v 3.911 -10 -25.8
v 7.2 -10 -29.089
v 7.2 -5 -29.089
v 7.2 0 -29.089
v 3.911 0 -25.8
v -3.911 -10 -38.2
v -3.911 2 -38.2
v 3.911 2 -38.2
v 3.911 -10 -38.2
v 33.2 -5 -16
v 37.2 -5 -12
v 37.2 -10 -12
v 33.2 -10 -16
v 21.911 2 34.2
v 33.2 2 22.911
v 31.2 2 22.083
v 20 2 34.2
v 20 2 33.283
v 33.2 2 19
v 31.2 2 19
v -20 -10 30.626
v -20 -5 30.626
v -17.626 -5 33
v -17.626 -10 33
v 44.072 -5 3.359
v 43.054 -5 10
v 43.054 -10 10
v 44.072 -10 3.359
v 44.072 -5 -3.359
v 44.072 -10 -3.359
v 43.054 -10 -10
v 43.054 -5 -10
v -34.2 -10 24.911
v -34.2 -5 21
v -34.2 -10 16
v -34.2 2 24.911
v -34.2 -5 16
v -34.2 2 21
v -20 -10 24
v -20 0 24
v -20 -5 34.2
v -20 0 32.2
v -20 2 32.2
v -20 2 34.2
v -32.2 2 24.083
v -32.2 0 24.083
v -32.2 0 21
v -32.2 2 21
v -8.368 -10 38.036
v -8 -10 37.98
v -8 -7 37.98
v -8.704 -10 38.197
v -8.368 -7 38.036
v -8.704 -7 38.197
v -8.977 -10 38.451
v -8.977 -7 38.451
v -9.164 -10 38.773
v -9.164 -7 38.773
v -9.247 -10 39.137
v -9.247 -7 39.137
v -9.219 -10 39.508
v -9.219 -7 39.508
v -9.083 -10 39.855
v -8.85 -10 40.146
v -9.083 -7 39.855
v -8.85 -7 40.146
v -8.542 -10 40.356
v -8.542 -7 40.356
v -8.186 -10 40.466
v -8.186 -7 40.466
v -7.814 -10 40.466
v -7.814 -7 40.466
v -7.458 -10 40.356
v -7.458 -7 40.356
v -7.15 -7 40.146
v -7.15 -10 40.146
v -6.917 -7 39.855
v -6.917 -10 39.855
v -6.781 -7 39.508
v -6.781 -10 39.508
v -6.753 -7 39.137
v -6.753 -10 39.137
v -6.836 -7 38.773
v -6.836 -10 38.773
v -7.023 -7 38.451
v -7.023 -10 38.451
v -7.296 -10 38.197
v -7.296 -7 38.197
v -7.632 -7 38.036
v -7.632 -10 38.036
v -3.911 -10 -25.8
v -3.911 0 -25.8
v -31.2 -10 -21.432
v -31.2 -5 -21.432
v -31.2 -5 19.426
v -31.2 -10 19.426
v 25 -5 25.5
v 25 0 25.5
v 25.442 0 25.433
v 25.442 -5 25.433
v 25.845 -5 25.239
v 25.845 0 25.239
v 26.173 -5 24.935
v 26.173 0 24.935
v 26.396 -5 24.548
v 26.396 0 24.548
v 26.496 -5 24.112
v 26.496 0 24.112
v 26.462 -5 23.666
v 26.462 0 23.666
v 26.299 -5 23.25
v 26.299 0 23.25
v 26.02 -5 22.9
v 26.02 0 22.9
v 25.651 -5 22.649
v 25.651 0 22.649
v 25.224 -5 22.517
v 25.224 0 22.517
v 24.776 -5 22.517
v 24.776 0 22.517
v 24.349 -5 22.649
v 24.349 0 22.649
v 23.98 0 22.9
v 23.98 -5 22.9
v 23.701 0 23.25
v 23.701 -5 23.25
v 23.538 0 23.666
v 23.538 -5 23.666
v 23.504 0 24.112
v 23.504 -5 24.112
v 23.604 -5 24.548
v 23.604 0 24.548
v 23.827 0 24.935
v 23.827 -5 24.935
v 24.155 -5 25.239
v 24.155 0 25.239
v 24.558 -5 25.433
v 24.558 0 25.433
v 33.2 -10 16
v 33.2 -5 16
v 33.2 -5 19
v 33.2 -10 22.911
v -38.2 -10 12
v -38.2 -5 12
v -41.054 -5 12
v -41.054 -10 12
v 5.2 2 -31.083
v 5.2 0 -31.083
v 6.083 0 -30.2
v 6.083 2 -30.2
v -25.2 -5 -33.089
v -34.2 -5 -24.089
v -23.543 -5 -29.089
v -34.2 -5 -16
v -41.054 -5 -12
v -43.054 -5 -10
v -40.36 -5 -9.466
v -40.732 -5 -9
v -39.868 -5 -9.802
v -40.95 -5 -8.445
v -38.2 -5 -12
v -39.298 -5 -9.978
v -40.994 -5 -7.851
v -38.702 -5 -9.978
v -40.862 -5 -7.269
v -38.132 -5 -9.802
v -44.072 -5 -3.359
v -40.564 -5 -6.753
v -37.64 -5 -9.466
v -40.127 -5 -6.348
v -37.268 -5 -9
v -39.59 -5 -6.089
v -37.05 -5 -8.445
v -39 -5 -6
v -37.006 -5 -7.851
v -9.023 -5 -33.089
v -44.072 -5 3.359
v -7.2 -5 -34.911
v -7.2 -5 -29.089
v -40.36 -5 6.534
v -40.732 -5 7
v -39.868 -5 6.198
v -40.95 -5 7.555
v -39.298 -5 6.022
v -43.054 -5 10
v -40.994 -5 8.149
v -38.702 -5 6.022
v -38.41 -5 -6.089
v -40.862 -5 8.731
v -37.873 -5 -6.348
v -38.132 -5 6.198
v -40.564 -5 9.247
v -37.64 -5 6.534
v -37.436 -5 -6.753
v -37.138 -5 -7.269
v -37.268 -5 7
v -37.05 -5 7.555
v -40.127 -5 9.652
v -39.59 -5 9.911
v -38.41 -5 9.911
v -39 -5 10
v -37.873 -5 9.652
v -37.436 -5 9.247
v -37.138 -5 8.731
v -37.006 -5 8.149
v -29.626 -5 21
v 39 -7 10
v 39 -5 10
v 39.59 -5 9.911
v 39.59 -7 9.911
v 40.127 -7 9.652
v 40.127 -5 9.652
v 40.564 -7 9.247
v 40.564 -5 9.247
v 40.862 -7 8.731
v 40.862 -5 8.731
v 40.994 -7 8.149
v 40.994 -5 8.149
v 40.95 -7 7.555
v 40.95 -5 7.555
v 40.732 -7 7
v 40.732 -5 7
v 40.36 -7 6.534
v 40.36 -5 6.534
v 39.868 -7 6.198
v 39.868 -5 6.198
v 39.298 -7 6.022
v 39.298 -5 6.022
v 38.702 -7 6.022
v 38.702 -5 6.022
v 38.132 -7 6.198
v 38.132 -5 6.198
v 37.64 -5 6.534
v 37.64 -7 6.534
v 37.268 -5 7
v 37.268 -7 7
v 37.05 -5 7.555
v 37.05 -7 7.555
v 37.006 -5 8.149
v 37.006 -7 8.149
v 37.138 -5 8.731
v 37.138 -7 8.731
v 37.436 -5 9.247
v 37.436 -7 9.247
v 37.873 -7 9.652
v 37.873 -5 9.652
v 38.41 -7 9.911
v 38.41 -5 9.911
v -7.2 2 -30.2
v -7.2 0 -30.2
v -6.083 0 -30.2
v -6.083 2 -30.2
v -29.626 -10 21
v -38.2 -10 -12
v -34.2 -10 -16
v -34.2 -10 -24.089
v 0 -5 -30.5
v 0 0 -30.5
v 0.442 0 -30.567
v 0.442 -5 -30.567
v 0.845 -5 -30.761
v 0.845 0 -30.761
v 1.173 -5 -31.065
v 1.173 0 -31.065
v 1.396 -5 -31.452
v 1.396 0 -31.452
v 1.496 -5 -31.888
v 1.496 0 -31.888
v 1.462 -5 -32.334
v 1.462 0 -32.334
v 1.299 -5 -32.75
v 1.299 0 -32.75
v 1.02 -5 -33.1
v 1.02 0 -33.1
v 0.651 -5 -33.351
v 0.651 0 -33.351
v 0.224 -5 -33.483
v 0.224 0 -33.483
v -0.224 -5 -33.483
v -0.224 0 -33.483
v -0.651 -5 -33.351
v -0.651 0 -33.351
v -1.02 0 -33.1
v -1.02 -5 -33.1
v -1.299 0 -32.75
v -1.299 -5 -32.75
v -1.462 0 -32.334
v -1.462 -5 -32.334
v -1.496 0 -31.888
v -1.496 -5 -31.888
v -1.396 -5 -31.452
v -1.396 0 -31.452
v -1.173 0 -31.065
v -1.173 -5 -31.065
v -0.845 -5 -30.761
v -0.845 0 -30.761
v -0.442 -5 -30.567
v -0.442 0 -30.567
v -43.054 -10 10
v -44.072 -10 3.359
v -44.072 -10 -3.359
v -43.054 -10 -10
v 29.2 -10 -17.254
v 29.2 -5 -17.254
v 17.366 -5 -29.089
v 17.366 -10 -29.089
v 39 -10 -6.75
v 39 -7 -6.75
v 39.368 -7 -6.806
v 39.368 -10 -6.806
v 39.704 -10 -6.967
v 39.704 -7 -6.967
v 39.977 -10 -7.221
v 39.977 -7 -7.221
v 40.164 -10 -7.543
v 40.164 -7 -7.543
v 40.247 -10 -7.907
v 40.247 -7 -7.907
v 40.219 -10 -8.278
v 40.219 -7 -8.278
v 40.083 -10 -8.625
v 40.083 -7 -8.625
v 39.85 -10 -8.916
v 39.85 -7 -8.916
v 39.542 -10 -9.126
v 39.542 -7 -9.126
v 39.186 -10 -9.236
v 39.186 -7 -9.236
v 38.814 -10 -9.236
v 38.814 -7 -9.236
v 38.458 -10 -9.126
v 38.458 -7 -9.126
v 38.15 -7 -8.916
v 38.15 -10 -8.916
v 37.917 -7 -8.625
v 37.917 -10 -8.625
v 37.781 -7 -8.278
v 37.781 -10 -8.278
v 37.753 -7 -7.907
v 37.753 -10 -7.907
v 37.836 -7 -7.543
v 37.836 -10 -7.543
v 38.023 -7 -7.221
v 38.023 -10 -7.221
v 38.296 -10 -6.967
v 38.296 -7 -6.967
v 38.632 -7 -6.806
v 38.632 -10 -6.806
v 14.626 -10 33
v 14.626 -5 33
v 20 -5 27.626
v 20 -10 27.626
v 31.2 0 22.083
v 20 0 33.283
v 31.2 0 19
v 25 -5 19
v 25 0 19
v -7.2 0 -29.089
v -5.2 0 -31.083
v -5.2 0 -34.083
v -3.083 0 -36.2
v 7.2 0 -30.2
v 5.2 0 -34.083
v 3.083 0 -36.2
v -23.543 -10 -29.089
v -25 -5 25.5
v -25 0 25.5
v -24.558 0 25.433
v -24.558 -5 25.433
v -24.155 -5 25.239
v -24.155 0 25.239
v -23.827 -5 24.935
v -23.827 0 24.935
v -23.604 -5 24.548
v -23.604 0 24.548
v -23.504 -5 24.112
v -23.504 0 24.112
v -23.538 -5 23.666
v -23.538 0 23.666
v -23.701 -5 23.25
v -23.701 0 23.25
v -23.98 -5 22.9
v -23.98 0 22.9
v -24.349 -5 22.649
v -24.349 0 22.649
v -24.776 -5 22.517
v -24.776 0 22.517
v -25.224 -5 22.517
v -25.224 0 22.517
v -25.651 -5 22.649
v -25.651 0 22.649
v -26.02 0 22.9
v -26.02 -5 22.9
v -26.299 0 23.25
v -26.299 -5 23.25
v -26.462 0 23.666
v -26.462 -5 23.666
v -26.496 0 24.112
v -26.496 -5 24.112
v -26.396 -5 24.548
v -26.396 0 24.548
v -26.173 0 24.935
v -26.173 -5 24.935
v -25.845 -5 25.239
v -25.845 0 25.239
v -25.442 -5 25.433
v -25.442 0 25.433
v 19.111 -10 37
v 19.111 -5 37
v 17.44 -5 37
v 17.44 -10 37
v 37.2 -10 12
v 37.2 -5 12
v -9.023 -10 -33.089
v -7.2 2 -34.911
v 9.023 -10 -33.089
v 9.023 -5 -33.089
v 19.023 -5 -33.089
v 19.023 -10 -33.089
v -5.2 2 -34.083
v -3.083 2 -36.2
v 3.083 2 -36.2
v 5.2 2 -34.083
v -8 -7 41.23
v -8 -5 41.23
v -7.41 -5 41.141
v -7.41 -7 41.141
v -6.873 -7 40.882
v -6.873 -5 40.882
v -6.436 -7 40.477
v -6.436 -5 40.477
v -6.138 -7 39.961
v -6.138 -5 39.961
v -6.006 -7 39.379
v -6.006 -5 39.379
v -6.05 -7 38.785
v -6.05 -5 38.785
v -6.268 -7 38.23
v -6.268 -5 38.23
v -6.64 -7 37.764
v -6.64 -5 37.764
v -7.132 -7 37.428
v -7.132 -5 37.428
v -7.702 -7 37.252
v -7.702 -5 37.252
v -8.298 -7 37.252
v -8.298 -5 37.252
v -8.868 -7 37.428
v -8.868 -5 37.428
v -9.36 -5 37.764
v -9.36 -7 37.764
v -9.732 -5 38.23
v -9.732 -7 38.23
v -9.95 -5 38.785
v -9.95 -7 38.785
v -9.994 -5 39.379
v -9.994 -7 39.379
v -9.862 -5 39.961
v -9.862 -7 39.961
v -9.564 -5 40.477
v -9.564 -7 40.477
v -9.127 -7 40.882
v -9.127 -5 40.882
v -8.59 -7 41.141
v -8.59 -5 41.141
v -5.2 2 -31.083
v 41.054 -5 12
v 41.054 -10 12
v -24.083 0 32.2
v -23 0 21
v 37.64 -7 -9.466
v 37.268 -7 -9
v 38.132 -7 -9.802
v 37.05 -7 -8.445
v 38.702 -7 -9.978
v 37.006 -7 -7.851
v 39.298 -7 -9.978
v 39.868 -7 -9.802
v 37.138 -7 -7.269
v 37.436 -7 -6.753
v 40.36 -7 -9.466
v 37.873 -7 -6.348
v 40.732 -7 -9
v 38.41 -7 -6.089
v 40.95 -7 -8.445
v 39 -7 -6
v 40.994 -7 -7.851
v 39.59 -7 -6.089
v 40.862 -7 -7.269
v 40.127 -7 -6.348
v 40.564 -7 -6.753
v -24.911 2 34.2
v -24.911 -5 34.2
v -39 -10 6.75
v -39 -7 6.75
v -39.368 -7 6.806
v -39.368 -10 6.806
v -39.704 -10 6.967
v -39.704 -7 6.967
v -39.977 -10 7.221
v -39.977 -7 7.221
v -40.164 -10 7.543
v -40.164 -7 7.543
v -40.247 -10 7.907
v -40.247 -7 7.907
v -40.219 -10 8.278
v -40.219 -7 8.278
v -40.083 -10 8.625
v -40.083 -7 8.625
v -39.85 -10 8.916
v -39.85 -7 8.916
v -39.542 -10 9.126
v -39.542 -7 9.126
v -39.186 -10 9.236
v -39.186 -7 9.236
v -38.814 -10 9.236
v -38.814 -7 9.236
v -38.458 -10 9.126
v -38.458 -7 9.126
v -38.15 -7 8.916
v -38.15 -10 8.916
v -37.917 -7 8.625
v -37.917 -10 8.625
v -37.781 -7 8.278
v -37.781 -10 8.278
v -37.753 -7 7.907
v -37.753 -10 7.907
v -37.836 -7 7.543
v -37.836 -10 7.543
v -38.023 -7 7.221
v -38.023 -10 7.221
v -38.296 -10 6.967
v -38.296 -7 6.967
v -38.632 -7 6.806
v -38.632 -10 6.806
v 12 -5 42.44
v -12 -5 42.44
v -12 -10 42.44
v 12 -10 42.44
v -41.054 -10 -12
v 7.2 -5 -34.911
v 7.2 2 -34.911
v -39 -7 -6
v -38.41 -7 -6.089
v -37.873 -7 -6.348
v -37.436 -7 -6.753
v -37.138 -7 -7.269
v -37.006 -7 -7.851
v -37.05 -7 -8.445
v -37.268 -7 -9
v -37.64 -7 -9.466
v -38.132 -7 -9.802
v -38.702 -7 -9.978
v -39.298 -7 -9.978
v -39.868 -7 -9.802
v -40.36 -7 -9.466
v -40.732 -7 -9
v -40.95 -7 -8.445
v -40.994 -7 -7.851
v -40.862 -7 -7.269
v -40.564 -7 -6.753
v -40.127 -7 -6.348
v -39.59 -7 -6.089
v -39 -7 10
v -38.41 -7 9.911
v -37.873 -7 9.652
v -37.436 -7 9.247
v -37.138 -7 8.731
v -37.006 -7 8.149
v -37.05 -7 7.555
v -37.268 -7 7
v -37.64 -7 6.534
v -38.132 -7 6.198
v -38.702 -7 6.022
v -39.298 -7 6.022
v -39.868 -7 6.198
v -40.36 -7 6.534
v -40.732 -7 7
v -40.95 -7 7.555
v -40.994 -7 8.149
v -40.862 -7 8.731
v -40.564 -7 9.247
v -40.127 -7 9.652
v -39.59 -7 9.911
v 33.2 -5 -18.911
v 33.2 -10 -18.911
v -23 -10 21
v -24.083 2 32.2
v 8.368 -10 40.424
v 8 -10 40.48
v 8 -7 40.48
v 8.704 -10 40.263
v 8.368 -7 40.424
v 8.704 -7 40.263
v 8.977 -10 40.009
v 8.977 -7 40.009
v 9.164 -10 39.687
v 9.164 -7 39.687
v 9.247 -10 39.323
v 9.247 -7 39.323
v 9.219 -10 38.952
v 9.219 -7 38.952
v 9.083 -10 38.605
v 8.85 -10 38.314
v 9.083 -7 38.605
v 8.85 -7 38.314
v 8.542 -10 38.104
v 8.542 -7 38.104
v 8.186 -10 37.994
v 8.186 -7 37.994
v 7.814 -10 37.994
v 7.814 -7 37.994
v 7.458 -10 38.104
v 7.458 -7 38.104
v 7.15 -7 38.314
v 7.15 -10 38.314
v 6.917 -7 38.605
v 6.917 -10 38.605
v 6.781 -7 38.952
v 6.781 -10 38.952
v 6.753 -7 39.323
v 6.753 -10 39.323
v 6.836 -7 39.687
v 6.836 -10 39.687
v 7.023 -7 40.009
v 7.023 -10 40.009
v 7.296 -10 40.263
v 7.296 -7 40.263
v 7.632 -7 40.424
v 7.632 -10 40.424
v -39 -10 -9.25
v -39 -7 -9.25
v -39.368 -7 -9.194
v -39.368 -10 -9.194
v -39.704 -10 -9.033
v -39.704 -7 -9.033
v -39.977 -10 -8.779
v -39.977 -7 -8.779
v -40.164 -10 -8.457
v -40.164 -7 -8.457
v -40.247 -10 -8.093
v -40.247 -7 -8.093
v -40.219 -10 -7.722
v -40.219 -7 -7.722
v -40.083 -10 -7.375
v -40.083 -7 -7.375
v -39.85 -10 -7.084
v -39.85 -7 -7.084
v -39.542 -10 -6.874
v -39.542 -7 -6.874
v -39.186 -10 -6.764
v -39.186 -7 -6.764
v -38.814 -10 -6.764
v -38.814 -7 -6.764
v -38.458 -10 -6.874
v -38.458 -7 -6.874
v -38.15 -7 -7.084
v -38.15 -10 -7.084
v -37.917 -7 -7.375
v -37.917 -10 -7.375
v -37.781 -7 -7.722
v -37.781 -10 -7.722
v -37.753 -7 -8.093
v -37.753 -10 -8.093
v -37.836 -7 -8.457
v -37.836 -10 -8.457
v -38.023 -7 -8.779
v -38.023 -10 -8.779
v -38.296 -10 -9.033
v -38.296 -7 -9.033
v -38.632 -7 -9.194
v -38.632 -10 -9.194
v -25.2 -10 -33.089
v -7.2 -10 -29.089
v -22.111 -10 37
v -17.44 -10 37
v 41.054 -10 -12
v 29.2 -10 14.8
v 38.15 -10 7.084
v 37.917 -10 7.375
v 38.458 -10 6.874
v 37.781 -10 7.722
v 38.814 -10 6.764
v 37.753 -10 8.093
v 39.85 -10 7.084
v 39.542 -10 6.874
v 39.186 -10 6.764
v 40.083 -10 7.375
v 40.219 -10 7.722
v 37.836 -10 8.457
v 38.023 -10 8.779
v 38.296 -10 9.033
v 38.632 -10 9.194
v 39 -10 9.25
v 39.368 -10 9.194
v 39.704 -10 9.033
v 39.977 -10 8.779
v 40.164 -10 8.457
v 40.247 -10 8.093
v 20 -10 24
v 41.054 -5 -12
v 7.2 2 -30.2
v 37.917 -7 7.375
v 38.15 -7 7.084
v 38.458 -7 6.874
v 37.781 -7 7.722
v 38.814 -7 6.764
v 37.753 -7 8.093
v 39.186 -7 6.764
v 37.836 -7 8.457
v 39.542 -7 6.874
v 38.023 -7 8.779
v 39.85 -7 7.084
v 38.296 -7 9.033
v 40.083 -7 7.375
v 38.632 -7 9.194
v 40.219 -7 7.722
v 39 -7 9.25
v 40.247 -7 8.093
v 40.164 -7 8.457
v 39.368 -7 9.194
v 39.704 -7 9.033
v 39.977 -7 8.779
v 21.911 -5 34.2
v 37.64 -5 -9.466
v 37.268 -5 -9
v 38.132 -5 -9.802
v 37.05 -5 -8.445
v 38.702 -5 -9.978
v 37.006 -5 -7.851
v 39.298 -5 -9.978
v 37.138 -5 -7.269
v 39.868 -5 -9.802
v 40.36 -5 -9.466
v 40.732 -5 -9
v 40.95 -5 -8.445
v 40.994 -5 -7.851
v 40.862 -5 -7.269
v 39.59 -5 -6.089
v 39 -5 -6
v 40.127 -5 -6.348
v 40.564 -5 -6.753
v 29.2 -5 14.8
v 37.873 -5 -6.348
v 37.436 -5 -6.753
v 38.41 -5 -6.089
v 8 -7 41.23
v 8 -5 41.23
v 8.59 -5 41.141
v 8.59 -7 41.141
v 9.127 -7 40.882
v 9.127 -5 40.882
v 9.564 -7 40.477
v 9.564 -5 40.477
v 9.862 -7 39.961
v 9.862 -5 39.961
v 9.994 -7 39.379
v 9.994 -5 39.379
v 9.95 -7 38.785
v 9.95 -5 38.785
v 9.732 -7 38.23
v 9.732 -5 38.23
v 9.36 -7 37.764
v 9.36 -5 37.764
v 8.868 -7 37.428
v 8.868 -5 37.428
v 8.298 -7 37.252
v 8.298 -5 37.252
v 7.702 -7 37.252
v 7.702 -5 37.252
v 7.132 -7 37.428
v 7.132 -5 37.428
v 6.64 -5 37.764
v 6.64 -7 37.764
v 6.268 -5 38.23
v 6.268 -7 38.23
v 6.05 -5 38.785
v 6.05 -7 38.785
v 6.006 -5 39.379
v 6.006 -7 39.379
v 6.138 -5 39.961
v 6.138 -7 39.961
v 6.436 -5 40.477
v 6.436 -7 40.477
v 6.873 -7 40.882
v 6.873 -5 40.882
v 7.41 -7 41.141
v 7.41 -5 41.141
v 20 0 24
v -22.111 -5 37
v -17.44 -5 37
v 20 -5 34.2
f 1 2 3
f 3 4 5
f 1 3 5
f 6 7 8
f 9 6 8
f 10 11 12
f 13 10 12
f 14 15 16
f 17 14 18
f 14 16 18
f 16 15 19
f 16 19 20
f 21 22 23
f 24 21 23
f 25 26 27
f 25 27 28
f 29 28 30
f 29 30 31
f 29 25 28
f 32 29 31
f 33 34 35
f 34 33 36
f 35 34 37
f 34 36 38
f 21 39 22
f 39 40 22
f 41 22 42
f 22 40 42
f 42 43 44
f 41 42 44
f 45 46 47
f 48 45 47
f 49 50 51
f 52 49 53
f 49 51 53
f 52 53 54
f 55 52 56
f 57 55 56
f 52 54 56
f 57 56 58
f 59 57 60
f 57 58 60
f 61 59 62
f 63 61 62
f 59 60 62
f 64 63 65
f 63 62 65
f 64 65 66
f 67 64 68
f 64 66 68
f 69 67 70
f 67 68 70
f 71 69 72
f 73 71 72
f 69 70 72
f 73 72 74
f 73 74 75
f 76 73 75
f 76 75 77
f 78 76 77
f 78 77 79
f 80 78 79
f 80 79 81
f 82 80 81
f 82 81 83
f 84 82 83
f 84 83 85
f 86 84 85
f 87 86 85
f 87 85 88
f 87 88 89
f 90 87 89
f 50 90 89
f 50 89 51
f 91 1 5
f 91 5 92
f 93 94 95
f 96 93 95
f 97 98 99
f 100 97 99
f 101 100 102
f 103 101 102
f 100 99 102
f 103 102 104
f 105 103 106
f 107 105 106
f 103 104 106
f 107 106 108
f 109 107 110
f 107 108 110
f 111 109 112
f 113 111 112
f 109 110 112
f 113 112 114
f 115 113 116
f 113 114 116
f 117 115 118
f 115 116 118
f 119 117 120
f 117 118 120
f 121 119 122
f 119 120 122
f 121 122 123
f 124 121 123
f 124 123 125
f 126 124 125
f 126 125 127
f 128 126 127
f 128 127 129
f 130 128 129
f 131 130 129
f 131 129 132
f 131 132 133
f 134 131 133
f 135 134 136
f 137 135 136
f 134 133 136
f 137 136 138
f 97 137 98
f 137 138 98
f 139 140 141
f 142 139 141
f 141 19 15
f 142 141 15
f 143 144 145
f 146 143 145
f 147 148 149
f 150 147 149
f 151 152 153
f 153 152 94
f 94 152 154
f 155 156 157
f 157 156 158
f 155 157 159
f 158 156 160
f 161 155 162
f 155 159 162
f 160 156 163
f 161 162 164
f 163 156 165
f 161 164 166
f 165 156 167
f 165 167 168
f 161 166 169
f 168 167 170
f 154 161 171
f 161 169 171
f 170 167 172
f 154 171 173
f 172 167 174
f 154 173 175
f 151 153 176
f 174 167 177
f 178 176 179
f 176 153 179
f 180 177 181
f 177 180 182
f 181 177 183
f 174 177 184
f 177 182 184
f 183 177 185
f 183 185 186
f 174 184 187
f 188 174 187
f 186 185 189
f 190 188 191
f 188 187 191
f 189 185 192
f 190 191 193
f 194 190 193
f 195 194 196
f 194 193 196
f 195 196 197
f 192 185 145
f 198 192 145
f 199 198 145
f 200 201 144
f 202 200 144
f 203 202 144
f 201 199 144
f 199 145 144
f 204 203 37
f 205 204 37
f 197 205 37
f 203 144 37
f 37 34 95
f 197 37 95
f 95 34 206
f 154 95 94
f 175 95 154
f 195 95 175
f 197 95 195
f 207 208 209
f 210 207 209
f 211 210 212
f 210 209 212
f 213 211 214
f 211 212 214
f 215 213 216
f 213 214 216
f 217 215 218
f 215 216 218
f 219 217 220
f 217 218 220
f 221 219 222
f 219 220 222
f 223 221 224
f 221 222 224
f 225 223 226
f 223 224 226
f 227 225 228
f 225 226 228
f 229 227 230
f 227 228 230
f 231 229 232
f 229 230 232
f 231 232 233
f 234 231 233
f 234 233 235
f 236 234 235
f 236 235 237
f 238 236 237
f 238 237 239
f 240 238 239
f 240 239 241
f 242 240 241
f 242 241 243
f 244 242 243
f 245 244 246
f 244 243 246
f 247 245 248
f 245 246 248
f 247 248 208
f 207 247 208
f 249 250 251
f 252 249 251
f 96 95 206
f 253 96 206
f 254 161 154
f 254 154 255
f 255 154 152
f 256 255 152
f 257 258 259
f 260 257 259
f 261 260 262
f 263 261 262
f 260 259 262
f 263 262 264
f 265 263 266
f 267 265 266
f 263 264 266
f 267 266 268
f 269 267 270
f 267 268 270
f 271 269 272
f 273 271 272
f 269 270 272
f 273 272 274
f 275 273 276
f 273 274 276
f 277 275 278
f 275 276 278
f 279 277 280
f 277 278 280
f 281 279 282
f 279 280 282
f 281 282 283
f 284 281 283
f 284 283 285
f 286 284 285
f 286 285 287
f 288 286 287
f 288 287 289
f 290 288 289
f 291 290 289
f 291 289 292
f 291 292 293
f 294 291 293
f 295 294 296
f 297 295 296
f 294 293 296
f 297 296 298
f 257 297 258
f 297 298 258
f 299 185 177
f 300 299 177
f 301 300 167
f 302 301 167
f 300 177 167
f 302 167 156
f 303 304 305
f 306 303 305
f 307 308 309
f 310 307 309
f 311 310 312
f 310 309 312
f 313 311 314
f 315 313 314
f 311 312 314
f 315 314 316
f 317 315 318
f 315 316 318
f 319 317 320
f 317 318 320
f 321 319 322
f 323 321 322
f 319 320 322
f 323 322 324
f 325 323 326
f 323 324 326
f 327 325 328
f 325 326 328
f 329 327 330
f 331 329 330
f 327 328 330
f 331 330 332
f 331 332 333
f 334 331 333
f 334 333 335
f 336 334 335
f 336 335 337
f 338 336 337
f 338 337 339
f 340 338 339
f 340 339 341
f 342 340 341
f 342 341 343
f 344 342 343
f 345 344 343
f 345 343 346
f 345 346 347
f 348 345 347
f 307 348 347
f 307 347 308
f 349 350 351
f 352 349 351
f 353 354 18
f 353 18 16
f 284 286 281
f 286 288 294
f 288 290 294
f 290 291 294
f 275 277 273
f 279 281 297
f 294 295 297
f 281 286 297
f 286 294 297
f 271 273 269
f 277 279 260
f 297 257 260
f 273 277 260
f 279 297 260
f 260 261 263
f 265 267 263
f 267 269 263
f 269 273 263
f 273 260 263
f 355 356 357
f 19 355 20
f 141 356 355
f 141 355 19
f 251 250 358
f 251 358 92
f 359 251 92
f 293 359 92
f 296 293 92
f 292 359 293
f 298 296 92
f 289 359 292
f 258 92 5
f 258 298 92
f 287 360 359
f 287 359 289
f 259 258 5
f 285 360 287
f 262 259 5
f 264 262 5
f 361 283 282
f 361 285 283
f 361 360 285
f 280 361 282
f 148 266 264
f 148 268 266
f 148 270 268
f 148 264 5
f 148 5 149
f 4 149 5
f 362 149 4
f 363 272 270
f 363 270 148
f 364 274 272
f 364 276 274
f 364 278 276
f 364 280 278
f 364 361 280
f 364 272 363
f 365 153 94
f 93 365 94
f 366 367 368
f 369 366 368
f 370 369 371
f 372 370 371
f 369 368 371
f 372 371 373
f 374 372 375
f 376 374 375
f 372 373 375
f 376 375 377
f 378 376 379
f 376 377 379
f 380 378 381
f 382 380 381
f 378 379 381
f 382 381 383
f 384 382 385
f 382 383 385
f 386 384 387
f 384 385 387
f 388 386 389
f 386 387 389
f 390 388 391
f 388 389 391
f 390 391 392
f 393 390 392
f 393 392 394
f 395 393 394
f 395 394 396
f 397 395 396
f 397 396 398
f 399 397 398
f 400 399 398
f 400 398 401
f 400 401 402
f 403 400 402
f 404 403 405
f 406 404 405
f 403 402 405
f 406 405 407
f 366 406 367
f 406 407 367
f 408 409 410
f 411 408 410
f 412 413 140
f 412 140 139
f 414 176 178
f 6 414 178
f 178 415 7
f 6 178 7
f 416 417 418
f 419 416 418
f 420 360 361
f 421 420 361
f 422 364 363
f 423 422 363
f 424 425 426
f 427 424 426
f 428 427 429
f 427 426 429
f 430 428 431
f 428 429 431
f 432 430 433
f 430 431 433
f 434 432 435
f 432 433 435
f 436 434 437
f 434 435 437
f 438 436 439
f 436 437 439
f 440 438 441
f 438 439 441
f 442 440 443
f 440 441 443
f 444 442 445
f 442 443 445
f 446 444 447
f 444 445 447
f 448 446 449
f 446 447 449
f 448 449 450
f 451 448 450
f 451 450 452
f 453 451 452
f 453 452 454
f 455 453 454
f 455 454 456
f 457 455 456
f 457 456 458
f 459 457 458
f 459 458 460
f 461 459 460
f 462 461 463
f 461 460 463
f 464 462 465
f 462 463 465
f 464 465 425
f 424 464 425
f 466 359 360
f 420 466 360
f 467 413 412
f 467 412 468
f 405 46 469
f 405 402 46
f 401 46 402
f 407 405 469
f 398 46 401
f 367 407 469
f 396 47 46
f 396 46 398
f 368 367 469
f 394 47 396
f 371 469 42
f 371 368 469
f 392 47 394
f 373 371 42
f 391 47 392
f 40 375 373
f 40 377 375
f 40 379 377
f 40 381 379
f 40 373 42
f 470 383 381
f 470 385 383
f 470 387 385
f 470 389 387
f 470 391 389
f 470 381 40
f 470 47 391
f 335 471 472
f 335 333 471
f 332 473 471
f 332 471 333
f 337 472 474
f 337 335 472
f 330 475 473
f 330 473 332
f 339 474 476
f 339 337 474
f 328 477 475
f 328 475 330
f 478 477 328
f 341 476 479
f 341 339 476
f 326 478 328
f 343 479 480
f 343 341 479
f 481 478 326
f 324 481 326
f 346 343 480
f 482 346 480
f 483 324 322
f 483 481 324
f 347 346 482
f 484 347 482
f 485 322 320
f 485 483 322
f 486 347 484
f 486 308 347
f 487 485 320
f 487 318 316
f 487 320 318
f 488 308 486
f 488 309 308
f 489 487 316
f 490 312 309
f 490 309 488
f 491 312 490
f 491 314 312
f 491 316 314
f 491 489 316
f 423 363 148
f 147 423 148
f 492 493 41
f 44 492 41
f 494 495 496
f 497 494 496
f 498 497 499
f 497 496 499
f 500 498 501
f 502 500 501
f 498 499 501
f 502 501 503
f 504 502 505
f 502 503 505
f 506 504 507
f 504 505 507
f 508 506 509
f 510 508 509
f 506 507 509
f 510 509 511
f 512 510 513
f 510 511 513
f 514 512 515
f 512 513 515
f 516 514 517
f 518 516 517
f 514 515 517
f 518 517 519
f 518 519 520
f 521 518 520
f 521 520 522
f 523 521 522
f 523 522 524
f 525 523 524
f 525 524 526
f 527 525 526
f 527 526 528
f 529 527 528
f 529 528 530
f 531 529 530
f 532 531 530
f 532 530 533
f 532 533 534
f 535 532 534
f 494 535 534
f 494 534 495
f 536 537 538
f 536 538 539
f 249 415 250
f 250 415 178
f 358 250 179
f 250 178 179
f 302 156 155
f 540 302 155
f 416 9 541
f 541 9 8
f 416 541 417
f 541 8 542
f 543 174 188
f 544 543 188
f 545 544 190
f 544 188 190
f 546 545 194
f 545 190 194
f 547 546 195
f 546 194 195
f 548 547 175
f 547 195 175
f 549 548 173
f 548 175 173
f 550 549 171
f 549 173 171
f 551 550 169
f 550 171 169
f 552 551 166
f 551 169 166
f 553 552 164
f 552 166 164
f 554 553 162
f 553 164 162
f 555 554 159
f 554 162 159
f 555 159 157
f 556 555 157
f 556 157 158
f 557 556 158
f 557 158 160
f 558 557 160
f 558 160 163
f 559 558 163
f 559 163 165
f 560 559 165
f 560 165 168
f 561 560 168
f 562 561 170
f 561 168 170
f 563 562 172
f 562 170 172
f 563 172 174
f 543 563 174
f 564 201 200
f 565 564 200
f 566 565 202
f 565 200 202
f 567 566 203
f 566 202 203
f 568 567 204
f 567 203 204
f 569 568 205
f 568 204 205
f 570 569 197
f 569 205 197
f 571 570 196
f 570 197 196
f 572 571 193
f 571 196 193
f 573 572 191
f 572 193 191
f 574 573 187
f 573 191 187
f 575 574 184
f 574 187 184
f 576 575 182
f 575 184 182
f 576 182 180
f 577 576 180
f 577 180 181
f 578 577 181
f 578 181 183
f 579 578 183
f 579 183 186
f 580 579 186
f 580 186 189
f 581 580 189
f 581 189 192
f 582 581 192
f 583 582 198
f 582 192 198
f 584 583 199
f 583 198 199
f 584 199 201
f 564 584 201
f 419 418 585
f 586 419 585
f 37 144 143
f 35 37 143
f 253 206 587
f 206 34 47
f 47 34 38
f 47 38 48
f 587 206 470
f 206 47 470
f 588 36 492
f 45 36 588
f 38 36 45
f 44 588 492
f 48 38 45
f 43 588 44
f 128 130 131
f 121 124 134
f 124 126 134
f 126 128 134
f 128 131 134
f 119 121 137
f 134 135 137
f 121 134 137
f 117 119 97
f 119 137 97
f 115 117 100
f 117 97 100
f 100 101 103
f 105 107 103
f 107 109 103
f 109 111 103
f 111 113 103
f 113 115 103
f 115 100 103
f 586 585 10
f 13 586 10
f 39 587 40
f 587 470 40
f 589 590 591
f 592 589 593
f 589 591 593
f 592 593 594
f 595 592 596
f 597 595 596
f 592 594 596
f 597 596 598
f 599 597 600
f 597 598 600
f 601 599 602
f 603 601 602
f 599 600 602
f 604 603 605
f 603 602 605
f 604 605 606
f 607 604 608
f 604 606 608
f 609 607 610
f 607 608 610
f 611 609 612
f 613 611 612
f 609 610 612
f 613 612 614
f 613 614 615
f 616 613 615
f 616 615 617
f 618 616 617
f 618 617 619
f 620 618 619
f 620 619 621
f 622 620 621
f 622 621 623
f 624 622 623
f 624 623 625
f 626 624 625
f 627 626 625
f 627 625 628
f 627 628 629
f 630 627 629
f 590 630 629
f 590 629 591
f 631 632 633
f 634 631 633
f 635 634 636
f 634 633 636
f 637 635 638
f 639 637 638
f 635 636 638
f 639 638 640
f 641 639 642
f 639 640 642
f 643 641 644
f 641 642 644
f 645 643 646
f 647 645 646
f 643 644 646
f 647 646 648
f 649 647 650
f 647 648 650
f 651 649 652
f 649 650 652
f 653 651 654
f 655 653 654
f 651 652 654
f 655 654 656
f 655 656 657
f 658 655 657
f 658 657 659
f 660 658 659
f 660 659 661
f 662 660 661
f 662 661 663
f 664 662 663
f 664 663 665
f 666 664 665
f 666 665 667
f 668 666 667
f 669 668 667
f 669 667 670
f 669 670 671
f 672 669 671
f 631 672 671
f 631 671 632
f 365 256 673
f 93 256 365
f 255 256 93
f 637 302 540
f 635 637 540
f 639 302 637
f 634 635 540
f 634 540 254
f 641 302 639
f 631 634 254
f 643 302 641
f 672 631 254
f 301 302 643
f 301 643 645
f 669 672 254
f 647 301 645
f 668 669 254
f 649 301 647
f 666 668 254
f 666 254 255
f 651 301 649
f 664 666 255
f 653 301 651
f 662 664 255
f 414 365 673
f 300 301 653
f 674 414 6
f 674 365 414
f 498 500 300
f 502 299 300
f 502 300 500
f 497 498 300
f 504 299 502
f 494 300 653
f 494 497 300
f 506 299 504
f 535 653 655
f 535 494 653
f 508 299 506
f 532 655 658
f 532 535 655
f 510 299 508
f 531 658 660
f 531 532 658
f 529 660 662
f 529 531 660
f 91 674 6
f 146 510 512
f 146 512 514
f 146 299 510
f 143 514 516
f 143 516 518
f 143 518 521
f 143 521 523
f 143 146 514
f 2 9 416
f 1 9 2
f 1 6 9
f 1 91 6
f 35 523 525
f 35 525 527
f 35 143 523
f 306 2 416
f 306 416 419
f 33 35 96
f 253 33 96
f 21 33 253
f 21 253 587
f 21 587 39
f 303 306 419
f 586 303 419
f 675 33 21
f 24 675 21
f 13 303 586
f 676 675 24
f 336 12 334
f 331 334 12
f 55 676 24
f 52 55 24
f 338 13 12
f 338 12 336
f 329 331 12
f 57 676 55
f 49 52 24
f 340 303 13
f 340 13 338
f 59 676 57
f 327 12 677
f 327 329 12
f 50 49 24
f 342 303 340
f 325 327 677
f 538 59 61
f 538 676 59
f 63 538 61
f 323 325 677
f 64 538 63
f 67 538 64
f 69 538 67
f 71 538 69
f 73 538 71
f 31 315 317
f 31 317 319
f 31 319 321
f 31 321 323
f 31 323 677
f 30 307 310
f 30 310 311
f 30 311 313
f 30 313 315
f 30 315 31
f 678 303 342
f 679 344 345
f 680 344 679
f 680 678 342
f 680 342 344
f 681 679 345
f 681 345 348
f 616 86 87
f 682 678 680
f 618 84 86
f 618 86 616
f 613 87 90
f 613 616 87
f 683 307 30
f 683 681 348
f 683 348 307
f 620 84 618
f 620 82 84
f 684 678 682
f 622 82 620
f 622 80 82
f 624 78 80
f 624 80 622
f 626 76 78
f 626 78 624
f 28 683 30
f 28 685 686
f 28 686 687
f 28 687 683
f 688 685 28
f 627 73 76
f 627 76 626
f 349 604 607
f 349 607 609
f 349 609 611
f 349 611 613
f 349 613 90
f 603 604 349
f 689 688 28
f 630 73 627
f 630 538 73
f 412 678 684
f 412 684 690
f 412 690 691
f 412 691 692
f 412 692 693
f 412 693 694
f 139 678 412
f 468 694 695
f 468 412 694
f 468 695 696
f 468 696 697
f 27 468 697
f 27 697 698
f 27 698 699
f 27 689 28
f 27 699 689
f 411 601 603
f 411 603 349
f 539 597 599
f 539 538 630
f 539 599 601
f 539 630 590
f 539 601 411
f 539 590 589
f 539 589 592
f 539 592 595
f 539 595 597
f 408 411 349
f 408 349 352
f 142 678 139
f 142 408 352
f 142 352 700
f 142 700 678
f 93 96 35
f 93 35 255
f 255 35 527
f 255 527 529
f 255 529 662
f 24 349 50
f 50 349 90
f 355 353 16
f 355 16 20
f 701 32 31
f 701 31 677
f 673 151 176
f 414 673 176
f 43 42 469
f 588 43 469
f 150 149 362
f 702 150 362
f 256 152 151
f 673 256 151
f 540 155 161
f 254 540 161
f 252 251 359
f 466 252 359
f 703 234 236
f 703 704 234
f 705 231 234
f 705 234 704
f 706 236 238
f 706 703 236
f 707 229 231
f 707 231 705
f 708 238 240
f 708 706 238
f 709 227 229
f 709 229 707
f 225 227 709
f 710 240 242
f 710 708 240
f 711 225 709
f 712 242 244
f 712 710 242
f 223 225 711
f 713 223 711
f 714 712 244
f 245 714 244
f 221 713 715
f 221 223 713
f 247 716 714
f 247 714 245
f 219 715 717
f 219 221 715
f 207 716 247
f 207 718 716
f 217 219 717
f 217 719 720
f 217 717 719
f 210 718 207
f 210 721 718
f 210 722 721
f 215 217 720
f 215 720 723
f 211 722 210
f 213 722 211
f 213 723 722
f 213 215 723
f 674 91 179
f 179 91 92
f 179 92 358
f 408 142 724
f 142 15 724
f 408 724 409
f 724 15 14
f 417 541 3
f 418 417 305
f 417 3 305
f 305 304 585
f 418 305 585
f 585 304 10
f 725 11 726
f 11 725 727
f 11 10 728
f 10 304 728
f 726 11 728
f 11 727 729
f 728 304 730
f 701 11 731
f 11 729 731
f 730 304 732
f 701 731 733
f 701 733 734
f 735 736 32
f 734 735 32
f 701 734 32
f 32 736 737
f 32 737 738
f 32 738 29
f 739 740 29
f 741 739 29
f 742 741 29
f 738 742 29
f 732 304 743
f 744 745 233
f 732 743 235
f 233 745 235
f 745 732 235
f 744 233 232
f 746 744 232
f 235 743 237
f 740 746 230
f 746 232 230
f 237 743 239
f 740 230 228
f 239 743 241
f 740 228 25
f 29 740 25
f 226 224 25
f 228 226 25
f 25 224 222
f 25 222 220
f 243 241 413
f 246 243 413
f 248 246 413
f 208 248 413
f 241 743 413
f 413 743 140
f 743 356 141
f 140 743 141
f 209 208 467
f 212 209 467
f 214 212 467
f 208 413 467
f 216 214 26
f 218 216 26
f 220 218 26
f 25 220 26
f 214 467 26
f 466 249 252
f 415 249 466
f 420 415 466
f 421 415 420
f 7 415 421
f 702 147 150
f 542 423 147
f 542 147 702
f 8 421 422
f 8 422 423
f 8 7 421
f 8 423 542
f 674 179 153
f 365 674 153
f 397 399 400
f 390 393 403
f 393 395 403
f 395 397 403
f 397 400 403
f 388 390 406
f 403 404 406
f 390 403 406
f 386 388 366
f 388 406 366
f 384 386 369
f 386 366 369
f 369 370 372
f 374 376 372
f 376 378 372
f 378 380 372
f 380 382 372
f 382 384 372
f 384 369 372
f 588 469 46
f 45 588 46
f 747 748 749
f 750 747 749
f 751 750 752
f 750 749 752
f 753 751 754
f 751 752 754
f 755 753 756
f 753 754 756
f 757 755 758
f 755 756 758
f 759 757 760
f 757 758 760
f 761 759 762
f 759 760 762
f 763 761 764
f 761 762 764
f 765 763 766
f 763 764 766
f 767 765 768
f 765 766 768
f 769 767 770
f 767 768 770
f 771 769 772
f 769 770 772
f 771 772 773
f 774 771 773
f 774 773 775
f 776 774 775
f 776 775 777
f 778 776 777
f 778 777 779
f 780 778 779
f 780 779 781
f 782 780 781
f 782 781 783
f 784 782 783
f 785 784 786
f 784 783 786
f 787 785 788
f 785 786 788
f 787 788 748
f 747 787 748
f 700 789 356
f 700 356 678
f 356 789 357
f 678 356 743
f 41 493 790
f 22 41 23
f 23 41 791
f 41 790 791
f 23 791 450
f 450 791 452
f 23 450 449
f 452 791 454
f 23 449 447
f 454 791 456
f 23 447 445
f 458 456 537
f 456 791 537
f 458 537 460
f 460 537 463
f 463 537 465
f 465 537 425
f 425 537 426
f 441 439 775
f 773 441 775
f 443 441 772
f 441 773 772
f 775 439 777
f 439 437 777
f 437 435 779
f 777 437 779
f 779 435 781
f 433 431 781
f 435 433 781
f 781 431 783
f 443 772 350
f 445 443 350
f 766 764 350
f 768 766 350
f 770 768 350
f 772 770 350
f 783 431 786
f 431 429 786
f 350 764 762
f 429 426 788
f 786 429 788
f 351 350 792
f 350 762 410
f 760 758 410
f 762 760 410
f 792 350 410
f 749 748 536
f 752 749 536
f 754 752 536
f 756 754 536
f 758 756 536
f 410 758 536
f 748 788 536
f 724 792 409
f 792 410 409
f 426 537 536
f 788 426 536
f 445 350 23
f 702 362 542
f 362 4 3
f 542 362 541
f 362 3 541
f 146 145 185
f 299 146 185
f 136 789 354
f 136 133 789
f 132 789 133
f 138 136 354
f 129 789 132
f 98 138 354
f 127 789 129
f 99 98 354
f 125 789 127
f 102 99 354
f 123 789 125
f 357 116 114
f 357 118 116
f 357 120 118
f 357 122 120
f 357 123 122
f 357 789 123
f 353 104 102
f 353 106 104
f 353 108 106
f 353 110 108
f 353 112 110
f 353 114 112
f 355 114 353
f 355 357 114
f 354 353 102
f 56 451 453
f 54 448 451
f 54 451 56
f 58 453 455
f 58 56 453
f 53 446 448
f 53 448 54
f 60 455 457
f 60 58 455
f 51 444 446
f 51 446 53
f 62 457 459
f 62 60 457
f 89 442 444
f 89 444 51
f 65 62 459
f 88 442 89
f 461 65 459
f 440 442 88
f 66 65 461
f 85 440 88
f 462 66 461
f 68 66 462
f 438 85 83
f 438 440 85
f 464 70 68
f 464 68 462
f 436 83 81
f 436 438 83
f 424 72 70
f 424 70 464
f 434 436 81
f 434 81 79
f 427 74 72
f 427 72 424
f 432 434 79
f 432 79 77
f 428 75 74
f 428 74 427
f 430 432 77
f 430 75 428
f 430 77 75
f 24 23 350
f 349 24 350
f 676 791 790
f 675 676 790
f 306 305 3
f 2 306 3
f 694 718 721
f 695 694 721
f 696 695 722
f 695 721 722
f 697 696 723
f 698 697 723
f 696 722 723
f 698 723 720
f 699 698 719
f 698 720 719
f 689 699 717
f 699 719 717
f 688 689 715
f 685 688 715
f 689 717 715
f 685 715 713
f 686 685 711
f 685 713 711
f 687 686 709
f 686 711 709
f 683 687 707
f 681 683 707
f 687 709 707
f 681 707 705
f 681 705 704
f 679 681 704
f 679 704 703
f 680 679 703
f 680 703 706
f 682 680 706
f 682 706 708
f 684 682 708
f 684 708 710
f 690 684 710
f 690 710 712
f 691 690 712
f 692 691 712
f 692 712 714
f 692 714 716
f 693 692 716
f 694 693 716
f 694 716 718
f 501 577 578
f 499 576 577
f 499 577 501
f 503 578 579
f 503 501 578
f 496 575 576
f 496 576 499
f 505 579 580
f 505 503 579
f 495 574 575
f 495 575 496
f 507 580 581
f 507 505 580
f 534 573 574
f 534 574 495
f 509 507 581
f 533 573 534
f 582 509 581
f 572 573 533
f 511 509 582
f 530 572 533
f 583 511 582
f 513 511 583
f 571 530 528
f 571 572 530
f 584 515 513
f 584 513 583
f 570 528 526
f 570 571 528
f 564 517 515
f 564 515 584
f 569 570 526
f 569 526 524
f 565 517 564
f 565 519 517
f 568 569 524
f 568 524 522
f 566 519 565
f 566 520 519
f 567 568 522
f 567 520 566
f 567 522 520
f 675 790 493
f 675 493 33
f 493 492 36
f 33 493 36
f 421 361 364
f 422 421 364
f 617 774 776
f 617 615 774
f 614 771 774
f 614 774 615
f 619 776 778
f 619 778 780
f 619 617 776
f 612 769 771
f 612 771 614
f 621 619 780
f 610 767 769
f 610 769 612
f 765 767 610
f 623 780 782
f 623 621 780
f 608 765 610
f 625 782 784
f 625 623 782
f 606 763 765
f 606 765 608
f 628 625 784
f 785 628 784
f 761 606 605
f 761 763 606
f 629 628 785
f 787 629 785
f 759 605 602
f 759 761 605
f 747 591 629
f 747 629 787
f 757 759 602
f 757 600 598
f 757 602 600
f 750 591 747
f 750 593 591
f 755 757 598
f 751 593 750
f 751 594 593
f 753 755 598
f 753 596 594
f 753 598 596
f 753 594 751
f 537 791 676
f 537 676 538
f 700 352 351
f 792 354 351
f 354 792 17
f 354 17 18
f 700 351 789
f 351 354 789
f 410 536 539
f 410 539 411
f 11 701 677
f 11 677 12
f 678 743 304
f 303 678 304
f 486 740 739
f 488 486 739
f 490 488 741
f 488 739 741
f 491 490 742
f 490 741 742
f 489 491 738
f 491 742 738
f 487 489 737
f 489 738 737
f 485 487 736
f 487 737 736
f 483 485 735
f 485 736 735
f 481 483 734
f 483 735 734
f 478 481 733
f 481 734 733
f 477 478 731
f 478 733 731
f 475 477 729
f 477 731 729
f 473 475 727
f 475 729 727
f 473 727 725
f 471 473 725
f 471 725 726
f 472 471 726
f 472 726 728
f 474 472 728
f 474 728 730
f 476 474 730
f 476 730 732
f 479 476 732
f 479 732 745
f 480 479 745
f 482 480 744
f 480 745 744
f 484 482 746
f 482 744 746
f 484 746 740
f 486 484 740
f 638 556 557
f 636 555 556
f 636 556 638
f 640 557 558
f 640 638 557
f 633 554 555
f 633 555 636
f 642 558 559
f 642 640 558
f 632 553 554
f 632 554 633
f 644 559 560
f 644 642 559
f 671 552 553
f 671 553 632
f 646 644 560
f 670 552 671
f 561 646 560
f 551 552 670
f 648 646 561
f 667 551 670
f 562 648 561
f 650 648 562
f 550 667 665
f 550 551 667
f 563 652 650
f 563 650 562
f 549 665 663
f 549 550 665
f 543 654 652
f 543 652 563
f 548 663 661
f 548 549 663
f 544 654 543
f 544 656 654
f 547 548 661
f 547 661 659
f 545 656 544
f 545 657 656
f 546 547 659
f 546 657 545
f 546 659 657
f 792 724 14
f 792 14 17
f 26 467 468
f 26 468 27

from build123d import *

# Parameters (mm, degrees)
SKETCH_2_R          = 1.5
EXTRUDE_2_DEPTH     = 5
EXTRUDE_2_2_DEPTH   = 5
EXTRUDE_2_3_DEPTH   = 5
EXTRUDE_5_DEPTH     = 2
EXTRUDE_6_DEPTH     = 2
EXTRUDE_7_DEPTH     = 5
SKETCH_11_R         = 1.25
EXTRUDE_8_DEPTH     = 5
CHAMFER_1_SIZE      = 4
SKETCH_12_R         = 2
CUT_EXTRUDE_1_DEPTH = 2


with BuildPart() as part:
    # Эскиз2 → Бобышка-Вытянуть2 (new body)
    with BuildSketch(Plane(origin=(0, 0, 0), x_dir=(1, 0, 0), z_dir=(0, 1, 0))):
        Polygon((7.2, 29.088730163), (7.2, 34.911269837), (3.911269837, 38.2), (-3.911269837, 38.2), (-7.2, 34.911269837), (-7.2, 29.088730163), (-3.911269837, 25.8), (3.911269837, 25.8), align=None)
        with Locations(Location((0, 32, 0), (0, 0, 270))):
            Circle(SKETCH_2_R, mode=Mode.SUBTRACT)
    extrude(amount=-EXTRUDE_2_DEPTH)



with BuildPart() as body_2:
    # Эскиз2 → Extrude 2 2 (new body)
    with BuildSketch(Plane(origin=(0, 0, 0), x_dir=(1, 0, 0), z_dir=(0, 1, 0))):
        Polygon((20, -24), (20, -33), (20, -34.2), (21.911269837, -34.2), (33.2, -22.911269837), (33.2, -19), (25, -19), align=None)
        with Locations(Location((25, -24, 0), (0, 0, 270))):
            Circle(SKETCH_2_R, mode=Mode.SUBTRACT)
    extrude(amount=-EXTRUDE_2_2_DEPTH)

    # Эскиз5 → Бобышка-Вытянуть6 (add)
    with BuildSketch(Plane(origin=(0, 0, 0), x_dir=(1, 0, 0), z_dir=(0, 1, 0))):
        Polygon((31.2, -19), (33.2, -19), (33.2, -22.911269837), (21.911269837, -34.2), (20, -34.2), (20, -33.282842712), (31.2, -22.082842712), align=None)
    extrude(amount=EXTRUDE_6_DEPTH)


with BuildPart() as body_3:
    # Эскиз2 → Extrude 2 3 (new body)
    with BuildSketch(Plane(origin=(0, 0, 0), x_dir=(1, 0, 0), z_dir=(0, 1, 0))):
        Polygon((-20, -34.2), (-20, -24), (-23, -21), (-34.2, -21), (-34.2, -24.911269837), (-24.911269837, -34.2), align=None)
        with Locations(Location((-25, -24, 0), (0, 0, 270))):
            Circle(SKETCH_2_R, mode=Mode.SUBTRACT)
    extrude(amount=-EXTRUDE_2_3_DEPTH)


with BuildPart() as part_1:
    add(part.part)

    add(body_3.part)  # Бобышка-Вытянуть5 merges body 3
    # Эскиз3 → Бобышка-Вытянуть5 (add)
    with BuildSketch(Plane(origin=(0, 0, 0), x_dir=(1, 0, 0), z_dir=(0, 1, 0))):
        Polygon((7.2, 30.2), (7.2, 34.911269837), (3.911269837, 38.2), (-3.911269837, 38.2), (-7.2, 34.911269837), (-7.2, 30.2), (-6.082842712, 30.2), (-5.2, 31.082842712), (-5.2, 34.082842712), (-3.082842712, 36.2), (3.082842712, 36.2), (5.2, 34.082842712), (5.2, 31.082842712), (6.082842712, 30.2), align=None)
        Polygon((-24.911269837, -34.2), (-20, -34.2), (-20, -32.2), (-24.082842712, -32.2), (-32.2, -24.082842712), (-32.2, -21), (-34.2, -21), (-34.2, -24.911269837), align=None)
    extrude(amount=EXTRUDE_5_DEPTH)


    add(body_2.part)  # Бобышка-Вытянуть7 merges body 2
    # Эскиз6 → Бобышка-Вытянуть7 (add)
    with BuildSketch(Plane.XZ.offset(5)):
        Polygon((-7.2, -34.911269837), (-3.911269837, -38.2), (3.911269837, -38.2), (7.2, -34.911269837), (9.022539674, -33.088730163), (19.022539674, -33.088730163), (33.2, -18.911269837), (33.2, 19), (33.2, 22.911269837), (21.911269837, 34.2), (19.111269837, 37), (13, 37), (-8, 37), (-22.111269837, 37), (-24.911269837, 34.2), (-34.2, 24.911269837), (-34.2, 21), (-34.2, -24.088730163), (-25.2, -33.088730163), (-9.022539674, -33.088730163), align=None)
        Polygon((7.2, -29.088730163), (3.911269837, -25.8), (-3.911269837, -25.8), (-7.2, -29.088730163), (-23.543145751, -29.088730163), (-31.2, -21.431875913), (-31.2, 19.425988463), (-29.625988463, 21), (-23, 21), (-20, 24), (-20, 30.625988463), (-17.625988463, 33), (14.625988463, 33), (20, 27.625988463), (20, 24), (25, 19), (29.2, 14.8), (29.2, -17.254415588), (17.365685425, -29.088730163), align=None, mode=Mode.SUBTRACT)
    extrude(amount=EXTRUDE_7_DEPTH)

    # Эскиз11 → Бобышка-Вытянуть8 (add)
    # profile 1 of 3: a face of its own
    with BuildSketch(Plane(origin=(0, -5, 0), x_dir=(1, 0, 0), z_dir=(0, 1, 0))):
        with BuildLine():
            Line((41.053919682, 12), (33.2, 12))
            Line((33.2, 12), (33.2, -12))
            Line((33.2, -12), (41.053919682, -12))
            Line((41.053919682, -12), (43.053919682, -10))
            ThreePointArc((43.053919682, -10), (44.2, 0), (43.053919682, 10))
            Line((43.053919682, 10), (41.053919682, 12))
        make_face()
        with Locations(Location((39, 8, 0), (0, 0, 270))):
            Circle(SKETCH_11_R, mode=Mode.SUBTRACT)
        with Locations(Location((39, -8, 0), (0, 0, 270))):
            Circle(SKETCH_11_R, mode=Mode.SUBTRACT)
    # profile 2 of 3: a face of its own
    with BuildSketch(Plane(origin=(0, -5, 0), x_dir=(1, 0, 0), z_dir=(0, 1, 0))):
        with BuildLine():
            Line((-41.053919682, 12), (-34.2, 12))
            Line((-34.2, 12), (-34.2, -12))
            Line((-34.2, -12), (-41.053919682, -12))
            Line((-41.053919682, -12), (-43.053919682, -10))
            ThreePointArc((-43.053919682, -10), (-44.2, 0), (-43.053919682, 10))
            Line((-43.053919682, 10), (-41.053919682, 12))
        make_face()
        with Locations(Location((-39, 8, 0), (0, 0, 90))):
            Circle(SKETCH_11_R, mode=Mode.SUBTRACT)
        with Locations(Location((-39, -8, 0), (0, 0, 90))):
            Circle(SKETCH_11_R, mode=Mode.SUBTRACT)
    # profile 3 of 3: a face of its own
    with BuildSketch(Plane(origin=(0, -5, 0), x_dir=(1, 0, 0), z_dir=(0, 1, 0))):
        Polygon((-12, -42.44), (12, -42.44), (17.44, -37), (-17.44, -37), align=None)
        with Locations(Location((8, -39.23, 0), (0, 0, 270))):
            Circle(SKETCH_11_R, mode=Mode.SUBTRACT)
        with Locations(Location((-8, -39.23, 0), (0, 0, 90))):
            Circle(SKETCH_11_R, mode=Mode.SUBTRACT)
    extrude(amount=-EXTRUDE_8_DEPTH)

    # Фаска1
    chamfer_1_edges = [part_1.edges().sort_by_distance(p)[0] for p in [
        (33.2, -7.5, 12),
        (33.2, -7.5, -12),
        (-34.2, -7.5, -12),
        (-34.2, -7.5, 12),
    ]]
    chamfer(chamfer_1_edges, length=CHAMFER_1_SIZE)

    # Эскиз12 → Вырез-Вытянуть1 (cut)
    with BuildSketch(Plane(origin=(0, -5, 0), x_dir=(1, 0, 0), z_dir=(0, 1, 0))):
        with Locations(Location((-39, 8, 0), (0, 0, 270))):
            Circle(SKETCH_12_R)
        with Locations(Location((-39, -8, 0), (0, 0, 270))):
            Circle(SKETCH_12_R)
        with Locations(Location((39, 8, 0), (0, 0, 270))):
            Circle(SKETCH_12_R)
        with Locations(Location((39, -8, 0), (0, 0, 270))):
            Circle(SKETCH_12_R)
        with Locations(Location((8, -39.23, 0), (0, 0, 270))):
            Circle(SKETCH_12_R)
        with Locations(Location((-8, -39.23, 0), (0, 0, 270))):
            Circle(SKETCH_12_R)
    extrude(amount=-CUT_EXTRUDE_1_DEPTH, mode=Mode.SUBTRACT)


solid = part_1.part
